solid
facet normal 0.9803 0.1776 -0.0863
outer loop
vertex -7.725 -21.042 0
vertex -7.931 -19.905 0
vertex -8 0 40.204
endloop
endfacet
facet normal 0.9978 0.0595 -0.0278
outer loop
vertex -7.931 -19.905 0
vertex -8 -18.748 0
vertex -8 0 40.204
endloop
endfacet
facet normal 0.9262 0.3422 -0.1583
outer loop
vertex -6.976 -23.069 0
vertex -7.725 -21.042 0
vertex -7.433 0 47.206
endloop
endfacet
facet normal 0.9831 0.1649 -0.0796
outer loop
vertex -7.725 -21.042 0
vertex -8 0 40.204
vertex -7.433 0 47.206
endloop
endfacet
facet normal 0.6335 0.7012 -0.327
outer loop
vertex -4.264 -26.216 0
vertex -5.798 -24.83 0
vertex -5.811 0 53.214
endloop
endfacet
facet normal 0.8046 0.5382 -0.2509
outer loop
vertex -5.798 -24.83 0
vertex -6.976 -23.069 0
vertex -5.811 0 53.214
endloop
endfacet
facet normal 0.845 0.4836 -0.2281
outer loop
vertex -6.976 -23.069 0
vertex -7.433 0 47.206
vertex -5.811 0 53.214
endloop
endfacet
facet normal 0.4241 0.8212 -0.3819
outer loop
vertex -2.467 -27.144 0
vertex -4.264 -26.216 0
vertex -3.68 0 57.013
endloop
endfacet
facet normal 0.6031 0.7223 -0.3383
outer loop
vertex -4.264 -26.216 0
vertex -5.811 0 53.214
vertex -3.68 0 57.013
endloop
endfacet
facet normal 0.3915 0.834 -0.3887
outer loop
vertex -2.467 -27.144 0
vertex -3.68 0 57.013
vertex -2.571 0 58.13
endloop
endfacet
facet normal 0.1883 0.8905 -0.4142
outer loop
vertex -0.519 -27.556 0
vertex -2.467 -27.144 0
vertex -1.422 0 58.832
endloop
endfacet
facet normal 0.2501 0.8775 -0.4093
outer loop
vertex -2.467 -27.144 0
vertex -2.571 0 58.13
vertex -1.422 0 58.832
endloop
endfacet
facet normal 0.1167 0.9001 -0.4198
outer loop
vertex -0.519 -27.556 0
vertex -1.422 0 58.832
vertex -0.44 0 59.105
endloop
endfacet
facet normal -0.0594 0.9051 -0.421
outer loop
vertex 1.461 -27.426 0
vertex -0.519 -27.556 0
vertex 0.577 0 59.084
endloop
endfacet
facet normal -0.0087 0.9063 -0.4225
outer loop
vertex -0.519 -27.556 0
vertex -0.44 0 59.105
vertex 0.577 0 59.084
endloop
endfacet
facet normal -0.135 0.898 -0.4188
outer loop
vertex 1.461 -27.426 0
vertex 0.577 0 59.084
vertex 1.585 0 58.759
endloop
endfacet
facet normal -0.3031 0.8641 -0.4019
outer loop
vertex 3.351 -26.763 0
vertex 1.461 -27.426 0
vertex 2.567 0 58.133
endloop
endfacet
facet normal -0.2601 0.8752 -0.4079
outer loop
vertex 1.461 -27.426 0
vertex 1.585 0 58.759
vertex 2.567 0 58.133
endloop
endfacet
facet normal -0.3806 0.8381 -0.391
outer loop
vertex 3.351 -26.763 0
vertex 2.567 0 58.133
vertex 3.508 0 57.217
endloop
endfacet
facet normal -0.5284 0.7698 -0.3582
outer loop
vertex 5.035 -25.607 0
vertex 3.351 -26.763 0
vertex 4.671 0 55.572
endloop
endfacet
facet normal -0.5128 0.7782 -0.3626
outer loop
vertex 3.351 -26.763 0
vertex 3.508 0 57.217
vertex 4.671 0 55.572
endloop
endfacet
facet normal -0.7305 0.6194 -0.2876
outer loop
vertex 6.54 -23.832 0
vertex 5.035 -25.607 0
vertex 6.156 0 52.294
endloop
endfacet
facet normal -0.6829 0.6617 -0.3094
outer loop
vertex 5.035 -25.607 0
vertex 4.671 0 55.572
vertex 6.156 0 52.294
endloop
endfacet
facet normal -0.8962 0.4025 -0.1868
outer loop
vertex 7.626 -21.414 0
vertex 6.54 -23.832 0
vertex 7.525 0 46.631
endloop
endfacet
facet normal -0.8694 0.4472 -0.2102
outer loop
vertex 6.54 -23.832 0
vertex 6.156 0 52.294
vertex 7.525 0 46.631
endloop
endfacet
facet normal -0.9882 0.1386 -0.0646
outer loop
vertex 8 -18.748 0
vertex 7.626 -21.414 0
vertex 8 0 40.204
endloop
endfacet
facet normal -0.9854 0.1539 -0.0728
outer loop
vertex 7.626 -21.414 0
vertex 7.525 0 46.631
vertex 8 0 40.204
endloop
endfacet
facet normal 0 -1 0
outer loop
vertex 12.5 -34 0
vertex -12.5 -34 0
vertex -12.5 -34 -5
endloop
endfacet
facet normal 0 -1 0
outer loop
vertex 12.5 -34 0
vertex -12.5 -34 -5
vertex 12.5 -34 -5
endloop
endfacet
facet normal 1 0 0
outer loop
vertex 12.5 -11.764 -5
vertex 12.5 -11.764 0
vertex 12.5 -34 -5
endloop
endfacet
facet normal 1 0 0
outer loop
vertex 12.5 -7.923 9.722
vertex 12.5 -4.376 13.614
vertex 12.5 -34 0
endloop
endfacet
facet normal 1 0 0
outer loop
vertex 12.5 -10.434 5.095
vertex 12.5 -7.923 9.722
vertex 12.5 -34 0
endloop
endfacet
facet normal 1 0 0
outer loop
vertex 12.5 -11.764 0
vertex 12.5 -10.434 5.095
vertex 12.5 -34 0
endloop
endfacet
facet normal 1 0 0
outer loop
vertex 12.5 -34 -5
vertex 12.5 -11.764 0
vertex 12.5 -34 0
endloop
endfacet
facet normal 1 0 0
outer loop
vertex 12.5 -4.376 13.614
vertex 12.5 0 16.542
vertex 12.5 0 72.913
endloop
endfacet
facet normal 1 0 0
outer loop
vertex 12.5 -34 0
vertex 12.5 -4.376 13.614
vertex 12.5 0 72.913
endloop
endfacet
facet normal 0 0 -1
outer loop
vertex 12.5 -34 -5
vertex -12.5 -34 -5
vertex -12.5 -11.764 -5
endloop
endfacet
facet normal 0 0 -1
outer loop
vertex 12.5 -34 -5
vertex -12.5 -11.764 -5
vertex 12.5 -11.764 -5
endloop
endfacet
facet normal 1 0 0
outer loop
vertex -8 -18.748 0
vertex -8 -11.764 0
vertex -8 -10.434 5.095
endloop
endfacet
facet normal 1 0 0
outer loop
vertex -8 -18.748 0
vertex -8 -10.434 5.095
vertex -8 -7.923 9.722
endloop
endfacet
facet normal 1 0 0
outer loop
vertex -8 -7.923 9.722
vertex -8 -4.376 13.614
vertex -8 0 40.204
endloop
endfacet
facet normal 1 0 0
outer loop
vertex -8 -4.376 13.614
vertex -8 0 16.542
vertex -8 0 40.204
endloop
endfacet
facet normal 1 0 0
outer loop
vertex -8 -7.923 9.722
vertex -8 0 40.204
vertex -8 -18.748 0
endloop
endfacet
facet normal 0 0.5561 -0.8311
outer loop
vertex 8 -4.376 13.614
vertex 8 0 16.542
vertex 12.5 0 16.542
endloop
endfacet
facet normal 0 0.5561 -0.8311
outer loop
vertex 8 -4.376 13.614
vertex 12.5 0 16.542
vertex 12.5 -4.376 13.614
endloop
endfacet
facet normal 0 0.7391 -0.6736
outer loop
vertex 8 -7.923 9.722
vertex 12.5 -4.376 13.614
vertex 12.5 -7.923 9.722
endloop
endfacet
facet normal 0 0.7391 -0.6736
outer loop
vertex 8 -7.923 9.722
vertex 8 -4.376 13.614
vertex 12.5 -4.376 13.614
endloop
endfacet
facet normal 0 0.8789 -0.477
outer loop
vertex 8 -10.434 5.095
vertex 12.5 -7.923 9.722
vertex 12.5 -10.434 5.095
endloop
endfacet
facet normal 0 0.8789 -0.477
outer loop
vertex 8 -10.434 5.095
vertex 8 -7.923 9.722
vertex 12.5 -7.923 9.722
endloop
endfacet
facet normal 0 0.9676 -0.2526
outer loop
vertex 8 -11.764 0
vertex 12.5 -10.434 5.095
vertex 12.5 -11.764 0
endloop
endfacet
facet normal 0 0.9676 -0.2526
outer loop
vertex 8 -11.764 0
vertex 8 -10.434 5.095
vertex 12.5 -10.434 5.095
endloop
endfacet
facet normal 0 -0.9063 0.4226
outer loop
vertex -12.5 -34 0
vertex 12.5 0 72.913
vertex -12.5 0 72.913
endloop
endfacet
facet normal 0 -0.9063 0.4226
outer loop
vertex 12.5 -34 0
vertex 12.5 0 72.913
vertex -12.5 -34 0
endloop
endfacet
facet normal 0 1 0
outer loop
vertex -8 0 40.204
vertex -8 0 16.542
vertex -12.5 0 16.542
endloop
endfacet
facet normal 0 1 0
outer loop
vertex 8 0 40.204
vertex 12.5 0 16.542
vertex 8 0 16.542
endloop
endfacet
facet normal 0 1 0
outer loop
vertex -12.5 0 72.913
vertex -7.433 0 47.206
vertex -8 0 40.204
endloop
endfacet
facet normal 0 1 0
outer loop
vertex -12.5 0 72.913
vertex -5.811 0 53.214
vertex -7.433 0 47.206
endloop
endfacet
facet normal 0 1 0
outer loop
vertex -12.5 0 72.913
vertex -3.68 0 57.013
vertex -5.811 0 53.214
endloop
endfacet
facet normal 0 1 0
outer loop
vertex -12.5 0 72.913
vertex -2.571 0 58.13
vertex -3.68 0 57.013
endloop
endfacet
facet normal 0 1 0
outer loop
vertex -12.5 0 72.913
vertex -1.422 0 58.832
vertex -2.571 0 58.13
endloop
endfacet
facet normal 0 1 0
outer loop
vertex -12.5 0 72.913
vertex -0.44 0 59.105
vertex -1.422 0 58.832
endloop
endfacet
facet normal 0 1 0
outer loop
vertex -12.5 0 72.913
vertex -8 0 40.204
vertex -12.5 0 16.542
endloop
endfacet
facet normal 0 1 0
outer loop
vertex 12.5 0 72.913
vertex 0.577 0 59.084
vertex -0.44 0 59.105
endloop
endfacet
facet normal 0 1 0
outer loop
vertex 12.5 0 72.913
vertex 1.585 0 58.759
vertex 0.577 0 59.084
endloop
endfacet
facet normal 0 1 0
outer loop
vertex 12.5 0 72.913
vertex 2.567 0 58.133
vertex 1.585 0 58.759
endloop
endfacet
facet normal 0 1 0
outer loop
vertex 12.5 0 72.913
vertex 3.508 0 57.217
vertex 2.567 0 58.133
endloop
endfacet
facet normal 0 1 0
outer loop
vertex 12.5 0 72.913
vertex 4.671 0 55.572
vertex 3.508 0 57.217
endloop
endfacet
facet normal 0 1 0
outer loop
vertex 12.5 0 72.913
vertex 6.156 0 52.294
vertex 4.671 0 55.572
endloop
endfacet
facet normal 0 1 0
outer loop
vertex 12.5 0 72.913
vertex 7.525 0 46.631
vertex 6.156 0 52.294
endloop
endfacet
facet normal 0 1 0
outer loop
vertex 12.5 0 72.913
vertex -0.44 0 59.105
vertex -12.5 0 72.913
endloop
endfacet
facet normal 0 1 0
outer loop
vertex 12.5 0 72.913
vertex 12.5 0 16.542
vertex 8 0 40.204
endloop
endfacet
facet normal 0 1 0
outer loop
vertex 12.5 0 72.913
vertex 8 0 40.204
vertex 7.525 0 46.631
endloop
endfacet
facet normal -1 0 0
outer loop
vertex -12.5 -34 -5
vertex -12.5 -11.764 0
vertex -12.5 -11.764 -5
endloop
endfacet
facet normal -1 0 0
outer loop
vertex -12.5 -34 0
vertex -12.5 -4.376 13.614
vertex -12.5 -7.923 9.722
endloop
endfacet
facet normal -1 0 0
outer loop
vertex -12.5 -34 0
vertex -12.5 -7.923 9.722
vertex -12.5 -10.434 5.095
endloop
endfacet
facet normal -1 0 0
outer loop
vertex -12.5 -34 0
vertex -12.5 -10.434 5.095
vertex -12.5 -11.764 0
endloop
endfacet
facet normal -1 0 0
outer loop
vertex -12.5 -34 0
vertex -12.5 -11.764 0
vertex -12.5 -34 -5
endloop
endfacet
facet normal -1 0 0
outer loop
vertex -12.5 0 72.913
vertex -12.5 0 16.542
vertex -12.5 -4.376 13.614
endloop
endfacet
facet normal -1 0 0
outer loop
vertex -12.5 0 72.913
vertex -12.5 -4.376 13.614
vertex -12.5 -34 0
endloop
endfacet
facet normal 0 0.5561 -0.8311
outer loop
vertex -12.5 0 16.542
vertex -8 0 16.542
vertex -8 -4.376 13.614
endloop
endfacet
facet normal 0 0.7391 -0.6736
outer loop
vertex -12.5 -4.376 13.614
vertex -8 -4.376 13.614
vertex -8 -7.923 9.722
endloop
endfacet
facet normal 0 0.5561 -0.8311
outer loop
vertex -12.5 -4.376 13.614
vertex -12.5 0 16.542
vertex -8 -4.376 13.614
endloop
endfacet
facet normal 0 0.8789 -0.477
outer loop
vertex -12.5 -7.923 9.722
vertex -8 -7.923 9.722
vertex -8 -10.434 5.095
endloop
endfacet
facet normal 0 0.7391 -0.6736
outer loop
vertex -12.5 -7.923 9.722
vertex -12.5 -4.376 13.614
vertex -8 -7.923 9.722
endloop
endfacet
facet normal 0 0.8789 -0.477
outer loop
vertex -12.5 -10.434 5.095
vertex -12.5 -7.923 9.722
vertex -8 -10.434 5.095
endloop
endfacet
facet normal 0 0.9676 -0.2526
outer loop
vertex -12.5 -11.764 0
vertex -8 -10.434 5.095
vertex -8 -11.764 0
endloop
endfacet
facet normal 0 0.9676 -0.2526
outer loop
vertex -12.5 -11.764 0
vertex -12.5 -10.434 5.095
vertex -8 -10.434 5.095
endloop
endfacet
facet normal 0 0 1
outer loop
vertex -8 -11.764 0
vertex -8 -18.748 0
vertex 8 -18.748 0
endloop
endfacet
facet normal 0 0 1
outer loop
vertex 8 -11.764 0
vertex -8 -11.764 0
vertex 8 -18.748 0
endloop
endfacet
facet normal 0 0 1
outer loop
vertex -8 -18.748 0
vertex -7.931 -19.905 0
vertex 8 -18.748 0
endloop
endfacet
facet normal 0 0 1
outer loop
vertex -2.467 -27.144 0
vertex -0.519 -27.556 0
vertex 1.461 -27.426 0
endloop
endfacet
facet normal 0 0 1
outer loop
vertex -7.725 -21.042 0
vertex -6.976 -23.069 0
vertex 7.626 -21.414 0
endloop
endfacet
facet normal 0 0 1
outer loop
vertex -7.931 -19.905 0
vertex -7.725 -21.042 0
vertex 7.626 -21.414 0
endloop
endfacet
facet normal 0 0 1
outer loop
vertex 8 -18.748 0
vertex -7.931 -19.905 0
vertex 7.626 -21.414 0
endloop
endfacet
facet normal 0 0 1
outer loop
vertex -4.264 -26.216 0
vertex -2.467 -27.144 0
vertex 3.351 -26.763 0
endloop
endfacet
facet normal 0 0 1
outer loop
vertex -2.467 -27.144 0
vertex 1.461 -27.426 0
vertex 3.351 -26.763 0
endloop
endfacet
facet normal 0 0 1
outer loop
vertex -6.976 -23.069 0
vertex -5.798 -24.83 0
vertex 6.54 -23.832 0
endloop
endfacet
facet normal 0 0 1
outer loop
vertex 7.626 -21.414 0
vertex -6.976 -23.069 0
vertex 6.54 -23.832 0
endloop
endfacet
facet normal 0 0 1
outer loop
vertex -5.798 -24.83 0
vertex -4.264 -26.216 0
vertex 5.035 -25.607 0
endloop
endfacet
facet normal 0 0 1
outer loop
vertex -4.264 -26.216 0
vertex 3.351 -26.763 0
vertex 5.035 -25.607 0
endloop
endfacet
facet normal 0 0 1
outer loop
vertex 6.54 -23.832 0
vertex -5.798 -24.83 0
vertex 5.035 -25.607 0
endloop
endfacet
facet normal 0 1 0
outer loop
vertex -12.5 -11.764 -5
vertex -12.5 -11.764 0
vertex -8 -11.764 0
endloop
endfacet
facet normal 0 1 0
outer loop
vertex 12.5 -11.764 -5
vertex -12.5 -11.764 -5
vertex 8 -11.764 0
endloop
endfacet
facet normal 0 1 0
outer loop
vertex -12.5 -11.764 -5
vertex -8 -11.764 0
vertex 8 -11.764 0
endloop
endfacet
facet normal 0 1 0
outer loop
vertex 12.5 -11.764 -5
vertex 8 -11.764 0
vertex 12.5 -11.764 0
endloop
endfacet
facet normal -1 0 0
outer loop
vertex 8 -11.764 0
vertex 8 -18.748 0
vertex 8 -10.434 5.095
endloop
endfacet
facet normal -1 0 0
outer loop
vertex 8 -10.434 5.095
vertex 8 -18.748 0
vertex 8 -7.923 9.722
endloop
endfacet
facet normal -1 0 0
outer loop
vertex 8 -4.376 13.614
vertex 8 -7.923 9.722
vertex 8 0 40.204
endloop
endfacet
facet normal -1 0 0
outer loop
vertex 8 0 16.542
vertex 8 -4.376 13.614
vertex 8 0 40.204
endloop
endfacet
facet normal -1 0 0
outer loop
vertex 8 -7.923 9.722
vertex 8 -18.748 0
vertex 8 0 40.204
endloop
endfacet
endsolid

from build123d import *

# Parameters (mm, degrees)
F1_DEPTH      = 12.5
F4_DEPTH      = 12.5
F4_DEPTH_BACK = 12.5
F6_DEPTH      = 78.7353324739
F7_W          = 25
F7_H          = 22.2357761898
F8_DEPTH      = 5


with BuildPart() as f1:
    # F0 (on Right) → F1 (new body, symmetric)
    with BuildSketch(Plane.YZ):
        Polygon((-34, 0), (0, 0), (0, 72.9132352973), align=None)
    extrude(amount=F1_DEPTH, both=True)

    # F3 (on Right) → F4 (cut, two sides)
    with BuildSketch(Plane.YZ) as f4_sk:
        with BuildLine():
            ThreePointArc((0, 16.5421399337), (-7.9228514216, 9.7223765395), (-11.7642238102, 0))
            Line((-11.7642238102, 0), (0, 0))
            Line((0, 0), (0, 16.5421399337))
        make_face()
    extrude(amount=-F4_DEPTH, mode=Mode.SUBTRACT)
    extrude(f4_sk.sketch, amount=F4_DEPTH_BACK, mode=Mode.SUBTRACT)

    # F5 (on face) → F6 (cut, up to face)
    with BuildSketch(Plane(origin=(0, 27.9273893647, 59.8904797643), x_dir=(1, 0, 0), z_dir=(0, 0.4226182617, 0.906307787))):
        with BuildLine():
            Line((-8, 3.5331053375), (-8, -16.9910104243))
            ThreePointArc((-8, -16.9910104243), (0, -24.9910104243), (8, -16.9910104243))
            Line((8, -16.9910104243), (8, 3.5331053375))
            Line((8, 3.5331053375), (-8, 3.5331053375))
        make_face()
    extrude(amount=-F6_DEPTH, mode=Mode.SUBTRACT)

    # F7 (on face) → F8 (join)
    with BuildSketch(Plane(origin=(0, 0, 0), x_dir=(1, 0, 0), z_dir=(0, 0, -1))):
        with Locations((0, 22.8821119051)):
            Rectangle(F7_W, F7_H)
    extrude(amount=F8_DEPTH)


solid = f1.part
